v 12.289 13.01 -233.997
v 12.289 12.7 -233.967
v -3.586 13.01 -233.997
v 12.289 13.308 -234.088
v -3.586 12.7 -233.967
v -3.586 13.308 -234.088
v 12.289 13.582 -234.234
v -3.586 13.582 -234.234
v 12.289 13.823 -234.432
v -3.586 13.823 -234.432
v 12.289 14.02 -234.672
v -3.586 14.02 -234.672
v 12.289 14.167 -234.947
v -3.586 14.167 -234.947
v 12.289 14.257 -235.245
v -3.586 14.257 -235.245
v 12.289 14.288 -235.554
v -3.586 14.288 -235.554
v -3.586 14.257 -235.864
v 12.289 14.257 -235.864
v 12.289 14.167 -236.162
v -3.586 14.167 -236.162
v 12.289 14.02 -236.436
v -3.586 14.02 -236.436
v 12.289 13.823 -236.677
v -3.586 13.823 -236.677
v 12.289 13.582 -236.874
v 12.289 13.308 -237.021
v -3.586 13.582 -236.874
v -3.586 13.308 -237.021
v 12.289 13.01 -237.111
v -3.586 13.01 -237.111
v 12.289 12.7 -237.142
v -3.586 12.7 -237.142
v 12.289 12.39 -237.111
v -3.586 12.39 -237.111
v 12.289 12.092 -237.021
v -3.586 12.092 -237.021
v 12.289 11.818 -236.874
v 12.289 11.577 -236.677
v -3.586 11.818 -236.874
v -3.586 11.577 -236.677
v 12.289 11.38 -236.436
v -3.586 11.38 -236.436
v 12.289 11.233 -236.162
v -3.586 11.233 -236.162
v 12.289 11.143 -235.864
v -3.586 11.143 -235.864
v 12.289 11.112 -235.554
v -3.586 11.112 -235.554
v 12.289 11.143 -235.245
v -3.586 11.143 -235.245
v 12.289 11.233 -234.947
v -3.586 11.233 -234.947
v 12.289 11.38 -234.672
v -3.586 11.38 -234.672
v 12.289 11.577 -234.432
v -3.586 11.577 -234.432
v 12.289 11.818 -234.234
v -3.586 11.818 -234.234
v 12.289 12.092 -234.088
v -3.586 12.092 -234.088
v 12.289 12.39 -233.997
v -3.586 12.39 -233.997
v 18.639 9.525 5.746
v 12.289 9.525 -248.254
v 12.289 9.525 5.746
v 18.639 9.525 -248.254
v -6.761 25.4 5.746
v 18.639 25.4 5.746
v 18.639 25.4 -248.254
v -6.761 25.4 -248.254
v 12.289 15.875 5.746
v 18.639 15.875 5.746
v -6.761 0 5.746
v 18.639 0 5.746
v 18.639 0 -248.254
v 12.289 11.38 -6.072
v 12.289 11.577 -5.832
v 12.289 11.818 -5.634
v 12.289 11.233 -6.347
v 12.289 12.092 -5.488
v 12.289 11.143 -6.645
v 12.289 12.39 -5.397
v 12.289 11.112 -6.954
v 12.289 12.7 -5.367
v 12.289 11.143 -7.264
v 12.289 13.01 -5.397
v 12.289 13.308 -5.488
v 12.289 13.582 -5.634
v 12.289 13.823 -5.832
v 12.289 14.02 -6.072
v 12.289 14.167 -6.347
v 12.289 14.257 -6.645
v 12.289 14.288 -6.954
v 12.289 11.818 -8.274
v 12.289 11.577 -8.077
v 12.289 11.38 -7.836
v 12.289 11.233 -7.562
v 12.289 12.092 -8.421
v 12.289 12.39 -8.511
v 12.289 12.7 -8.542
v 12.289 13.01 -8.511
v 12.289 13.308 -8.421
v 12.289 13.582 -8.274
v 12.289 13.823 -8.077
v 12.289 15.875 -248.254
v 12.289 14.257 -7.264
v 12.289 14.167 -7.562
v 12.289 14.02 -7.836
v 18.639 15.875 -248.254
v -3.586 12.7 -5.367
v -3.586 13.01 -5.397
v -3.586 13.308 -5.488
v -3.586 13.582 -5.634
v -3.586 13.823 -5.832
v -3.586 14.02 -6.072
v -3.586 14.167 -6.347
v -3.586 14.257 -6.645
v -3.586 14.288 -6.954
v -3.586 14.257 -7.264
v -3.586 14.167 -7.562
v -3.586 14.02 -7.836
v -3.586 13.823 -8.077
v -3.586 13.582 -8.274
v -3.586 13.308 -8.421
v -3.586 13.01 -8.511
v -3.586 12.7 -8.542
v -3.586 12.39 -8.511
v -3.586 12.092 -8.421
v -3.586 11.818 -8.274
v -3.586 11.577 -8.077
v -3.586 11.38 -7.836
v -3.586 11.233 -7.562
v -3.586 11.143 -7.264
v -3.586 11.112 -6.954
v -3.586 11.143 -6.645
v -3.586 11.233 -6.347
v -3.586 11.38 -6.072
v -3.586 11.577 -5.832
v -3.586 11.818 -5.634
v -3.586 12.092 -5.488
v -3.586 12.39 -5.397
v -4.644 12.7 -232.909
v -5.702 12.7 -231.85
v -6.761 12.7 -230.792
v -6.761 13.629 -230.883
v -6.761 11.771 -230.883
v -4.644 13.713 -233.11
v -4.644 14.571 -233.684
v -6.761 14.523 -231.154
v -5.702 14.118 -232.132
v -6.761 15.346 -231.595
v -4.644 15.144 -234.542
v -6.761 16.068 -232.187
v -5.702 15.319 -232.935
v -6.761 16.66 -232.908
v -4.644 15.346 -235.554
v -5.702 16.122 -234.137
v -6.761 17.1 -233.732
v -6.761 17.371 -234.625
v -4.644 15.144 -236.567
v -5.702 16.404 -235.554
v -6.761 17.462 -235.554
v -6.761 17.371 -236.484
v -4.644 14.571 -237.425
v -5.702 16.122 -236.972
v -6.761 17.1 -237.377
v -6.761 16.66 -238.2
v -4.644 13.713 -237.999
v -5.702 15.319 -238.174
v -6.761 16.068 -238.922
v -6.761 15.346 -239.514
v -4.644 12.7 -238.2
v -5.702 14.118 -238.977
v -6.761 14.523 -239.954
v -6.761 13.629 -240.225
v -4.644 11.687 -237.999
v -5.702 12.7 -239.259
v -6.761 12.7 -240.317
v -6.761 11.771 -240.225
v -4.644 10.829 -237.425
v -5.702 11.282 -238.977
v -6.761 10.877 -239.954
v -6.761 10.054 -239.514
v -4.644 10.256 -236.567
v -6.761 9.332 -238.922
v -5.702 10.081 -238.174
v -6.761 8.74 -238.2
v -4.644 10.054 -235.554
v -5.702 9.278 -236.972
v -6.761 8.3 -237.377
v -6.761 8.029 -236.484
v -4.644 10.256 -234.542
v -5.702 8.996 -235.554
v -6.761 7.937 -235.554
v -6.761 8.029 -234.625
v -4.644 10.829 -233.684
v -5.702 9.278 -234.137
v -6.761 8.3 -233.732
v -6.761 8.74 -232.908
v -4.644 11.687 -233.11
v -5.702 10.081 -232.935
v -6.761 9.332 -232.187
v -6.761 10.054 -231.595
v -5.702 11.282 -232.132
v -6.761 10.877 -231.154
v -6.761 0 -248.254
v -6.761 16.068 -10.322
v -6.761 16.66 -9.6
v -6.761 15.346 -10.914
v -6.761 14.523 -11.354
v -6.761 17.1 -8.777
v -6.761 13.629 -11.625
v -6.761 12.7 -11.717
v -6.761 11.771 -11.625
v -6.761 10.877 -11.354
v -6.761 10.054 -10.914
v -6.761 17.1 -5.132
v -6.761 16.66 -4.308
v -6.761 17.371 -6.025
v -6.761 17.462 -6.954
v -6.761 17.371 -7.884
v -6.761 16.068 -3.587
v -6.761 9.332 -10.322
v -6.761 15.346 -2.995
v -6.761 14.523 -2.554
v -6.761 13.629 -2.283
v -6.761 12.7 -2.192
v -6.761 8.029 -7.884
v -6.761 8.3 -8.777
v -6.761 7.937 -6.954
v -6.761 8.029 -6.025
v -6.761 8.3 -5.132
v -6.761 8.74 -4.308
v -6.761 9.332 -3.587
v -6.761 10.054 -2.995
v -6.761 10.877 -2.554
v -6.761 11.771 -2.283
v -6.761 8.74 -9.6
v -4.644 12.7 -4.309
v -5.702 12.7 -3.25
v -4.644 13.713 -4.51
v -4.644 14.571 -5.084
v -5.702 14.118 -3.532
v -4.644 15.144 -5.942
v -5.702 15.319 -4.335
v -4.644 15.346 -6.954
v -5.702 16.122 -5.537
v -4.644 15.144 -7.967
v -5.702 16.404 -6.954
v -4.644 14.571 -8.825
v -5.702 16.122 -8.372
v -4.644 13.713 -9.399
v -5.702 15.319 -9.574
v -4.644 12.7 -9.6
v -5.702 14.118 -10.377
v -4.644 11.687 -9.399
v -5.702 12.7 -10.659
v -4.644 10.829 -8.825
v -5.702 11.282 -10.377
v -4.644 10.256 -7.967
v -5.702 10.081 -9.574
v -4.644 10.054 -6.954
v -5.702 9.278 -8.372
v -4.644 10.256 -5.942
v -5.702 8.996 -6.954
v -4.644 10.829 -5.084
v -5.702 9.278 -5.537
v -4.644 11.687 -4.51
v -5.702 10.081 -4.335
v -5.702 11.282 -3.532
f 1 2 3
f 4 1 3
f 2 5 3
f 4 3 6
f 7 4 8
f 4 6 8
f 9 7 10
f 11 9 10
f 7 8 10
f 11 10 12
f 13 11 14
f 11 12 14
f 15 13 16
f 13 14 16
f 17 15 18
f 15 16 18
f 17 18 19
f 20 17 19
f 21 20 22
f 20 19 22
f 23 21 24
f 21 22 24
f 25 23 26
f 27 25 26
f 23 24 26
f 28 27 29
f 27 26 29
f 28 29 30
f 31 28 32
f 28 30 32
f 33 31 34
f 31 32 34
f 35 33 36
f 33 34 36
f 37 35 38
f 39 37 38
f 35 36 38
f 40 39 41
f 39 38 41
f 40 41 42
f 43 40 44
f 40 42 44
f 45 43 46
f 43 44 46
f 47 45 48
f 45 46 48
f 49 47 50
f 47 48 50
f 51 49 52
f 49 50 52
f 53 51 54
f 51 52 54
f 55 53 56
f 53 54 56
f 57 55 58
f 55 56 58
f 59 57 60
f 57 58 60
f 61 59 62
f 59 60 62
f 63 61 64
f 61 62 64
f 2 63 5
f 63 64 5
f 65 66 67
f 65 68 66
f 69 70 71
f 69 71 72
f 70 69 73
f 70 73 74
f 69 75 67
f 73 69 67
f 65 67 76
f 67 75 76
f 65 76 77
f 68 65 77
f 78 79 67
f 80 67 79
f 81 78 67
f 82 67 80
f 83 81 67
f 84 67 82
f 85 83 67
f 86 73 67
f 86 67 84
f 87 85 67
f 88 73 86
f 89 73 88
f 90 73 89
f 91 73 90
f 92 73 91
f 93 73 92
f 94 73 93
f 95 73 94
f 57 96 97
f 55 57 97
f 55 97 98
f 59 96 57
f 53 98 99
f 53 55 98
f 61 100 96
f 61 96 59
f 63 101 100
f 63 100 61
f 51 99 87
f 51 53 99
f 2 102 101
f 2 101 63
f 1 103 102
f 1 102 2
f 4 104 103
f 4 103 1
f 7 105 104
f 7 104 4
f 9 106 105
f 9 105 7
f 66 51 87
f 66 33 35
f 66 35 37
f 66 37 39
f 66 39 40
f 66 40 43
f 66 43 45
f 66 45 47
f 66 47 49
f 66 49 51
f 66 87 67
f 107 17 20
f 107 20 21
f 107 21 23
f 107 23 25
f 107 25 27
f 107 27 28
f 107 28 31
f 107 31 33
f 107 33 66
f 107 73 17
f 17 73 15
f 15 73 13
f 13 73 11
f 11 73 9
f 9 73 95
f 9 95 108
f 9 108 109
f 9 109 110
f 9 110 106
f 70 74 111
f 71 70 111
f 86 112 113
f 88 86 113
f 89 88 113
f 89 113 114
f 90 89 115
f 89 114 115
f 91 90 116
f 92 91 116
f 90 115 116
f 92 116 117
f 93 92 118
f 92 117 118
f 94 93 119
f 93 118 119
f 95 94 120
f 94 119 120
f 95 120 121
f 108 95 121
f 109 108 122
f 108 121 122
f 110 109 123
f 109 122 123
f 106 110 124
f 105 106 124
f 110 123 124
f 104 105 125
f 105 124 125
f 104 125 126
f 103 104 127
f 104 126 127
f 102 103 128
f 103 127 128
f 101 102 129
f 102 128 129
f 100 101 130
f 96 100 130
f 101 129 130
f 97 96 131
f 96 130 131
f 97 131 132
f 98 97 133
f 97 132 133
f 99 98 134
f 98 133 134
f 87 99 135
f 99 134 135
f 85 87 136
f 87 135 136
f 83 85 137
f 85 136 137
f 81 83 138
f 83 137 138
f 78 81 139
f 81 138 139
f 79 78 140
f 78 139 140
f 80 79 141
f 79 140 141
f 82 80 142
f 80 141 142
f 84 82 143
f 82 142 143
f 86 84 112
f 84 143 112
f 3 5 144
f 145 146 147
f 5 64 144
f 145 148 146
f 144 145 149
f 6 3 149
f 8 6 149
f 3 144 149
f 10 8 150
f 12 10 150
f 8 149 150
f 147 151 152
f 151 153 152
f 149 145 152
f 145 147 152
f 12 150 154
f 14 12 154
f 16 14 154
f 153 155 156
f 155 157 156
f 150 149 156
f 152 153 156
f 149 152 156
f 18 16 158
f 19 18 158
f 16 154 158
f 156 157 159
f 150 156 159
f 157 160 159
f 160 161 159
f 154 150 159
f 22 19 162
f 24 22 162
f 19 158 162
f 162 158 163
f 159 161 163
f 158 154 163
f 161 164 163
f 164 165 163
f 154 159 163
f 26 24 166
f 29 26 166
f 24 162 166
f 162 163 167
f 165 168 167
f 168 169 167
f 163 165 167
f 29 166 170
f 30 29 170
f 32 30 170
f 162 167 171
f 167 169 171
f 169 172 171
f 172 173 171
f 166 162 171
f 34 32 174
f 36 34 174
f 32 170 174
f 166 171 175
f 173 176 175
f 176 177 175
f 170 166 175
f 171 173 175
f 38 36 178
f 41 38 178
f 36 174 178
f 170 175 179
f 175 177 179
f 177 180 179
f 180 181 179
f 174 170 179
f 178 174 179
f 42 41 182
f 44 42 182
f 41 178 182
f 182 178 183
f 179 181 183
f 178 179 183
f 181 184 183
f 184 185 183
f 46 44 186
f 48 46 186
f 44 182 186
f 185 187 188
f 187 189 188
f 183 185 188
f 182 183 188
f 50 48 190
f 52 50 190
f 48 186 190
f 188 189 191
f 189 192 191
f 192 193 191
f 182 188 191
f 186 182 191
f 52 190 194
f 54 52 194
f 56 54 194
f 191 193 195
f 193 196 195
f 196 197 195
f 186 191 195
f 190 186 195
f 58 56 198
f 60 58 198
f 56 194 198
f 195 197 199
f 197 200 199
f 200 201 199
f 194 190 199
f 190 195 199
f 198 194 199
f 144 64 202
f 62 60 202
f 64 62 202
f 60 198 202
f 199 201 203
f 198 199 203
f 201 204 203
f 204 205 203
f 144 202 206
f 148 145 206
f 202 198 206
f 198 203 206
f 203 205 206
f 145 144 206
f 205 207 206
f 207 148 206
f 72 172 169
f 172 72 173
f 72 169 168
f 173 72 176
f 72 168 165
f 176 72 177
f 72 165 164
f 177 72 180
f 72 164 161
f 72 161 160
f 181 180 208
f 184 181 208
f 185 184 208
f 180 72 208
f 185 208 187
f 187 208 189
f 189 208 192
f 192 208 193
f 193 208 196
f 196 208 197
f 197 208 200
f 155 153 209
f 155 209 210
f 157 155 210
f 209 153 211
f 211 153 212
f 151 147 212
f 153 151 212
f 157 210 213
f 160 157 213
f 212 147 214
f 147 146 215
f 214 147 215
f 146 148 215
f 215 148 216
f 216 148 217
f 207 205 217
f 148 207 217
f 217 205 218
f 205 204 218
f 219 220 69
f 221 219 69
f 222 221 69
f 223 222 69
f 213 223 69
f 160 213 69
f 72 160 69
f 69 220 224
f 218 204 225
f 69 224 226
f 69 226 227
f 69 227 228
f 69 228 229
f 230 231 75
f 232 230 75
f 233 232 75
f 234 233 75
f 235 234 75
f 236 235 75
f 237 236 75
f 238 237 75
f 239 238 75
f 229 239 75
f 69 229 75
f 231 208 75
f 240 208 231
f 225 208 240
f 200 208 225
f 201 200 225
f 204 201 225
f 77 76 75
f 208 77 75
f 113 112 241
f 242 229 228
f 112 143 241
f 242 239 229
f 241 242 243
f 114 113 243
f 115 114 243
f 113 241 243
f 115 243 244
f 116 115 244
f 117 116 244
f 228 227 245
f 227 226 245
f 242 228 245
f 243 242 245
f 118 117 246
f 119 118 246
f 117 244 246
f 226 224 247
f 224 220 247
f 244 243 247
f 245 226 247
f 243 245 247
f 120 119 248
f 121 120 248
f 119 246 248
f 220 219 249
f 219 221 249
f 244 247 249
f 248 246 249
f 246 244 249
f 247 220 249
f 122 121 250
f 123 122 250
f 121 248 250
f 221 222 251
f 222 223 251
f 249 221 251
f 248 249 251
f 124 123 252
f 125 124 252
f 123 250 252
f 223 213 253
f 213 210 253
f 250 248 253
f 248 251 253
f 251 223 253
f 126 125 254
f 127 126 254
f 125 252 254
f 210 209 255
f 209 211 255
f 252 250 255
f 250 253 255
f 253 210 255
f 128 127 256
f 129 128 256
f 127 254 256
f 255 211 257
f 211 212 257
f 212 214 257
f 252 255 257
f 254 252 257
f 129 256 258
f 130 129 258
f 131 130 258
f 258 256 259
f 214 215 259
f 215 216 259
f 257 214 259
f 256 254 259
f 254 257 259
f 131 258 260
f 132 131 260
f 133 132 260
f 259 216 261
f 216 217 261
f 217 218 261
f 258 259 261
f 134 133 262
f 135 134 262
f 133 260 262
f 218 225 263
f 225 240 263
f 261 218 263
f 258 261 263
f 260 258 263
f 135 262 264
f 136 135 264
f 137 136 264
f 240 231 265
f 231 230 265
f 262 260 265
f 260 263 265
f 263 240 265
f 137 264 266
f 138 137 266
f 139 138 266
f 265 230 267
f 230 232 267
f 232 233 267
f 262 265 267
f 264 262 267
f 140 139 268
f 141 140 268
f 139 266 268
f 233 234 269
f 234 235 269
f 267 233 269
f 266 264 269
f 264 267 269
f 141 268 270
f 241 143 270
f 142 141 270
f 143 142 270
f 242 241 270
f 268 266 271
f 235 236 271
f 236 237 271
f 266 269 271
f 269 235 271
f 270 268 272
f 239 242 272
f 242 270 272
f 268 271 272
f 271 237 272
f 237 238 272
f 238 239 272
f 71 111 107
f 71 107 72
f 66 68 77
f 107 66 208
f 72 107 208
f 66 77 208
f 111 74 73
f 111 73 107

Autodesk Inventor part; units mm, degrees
ref_plane "YZ Plane" through (0, 0, 0) normal (1, 0, 0) x (0, 1, 0)
ref_plane "XZ Plane" through (0, 0, 0) normal (0, 1, 0) x (-1, 0, 0)
ref_plane "XY Plane" through (0, 0, 0) normal (0, 0, 1) x (1, 0, 0)
sketch "Sketch1" plane through (0, 0, 0) normal (0, 1, 0) x (-1, 0, 0)
  line L0 (6.7607, 5.7456) -> (-18.6393, 5.7456)
  line L1 (-18.6393, 5.7456) -> (-18.6393, -248.2544)
  line L2 (-18.6393, -248.2544) -> (6.7607, -248.2544)
  line L3 (6.7607, -248.2544) -> (6.7607, 5.7456)
  point P0 (0, 0)
  dimension "d0" = 25.4
  dimension "d1" = 254
extrude "Extrusion1" add sketch "Sketch1" along normal blind 25.4
sketch "Sketch2" plane through (18.6393, 0, 5.7456) normal (1, 0, 0) x (0, 0, -1)
  line L0 (0, 0) -> (0, 25.4) projected
  line L1 (254, 0) -> (254, 25.4) projected
  line L2 (0, 15.875) -> (254, 15.875)
  line L3 (254, 15.875) -> (254, 9.525)
  line L4 (254, 9.525) -> (0, 9.525)
  line L5 (0, 9.525) -> (0, 15.875)
  line L6 (0, 25.4) -> (254, 25.4) projected
  line L7 (0, 0) -> (254, 0) projected
  point P0 (5.7456, 0)
  point P1 (0, 9.525)
  dimension "d4" = 6.35
  dimension "d5" = 9.525
extrude "Extrusion2" cut sketch "Sketch2" against normal blind 6.35 contours L0 L2 L1 L4
sketch "Sketch3" plane through (-6.7607, 0, -248.2544) normal (-1, 0, 0) x (0, 0, 1)
  circle A0 centre (241.3, 12.7) radius 1.5875
  circle A1 centre (12.7, 12.7) radius 1.5875
  line L0 (0, 0) -> (0, 25.4) projected
  line L1 (0, 25.4) -> (254, 25.4) projected
  line L2 (254, 0) -> (254, 25.4) projected
  line L3 (0, 0) -> (254, 0) projected
  point P0 (248.2544, 0)
  dimension "d8" = 3.175
  dimension "d9" = 3.175
  dimension "d10" = 12.7
  dimension "d11" = 12.7
  dimension "d12" = 12.7
  dimension "d13" = 12.7
extrude "Extrusion3" cut sketch "Sketch3" against normal blind 76.2 contours A0 | A1
chamfer "Chamfer1" distance 3.175 angle 45 2 edges at (-6.7607, 12.7, -237.1419) (-6.7607, 12.7, -8.5419)
properties part number "glass holder drawr X8"
